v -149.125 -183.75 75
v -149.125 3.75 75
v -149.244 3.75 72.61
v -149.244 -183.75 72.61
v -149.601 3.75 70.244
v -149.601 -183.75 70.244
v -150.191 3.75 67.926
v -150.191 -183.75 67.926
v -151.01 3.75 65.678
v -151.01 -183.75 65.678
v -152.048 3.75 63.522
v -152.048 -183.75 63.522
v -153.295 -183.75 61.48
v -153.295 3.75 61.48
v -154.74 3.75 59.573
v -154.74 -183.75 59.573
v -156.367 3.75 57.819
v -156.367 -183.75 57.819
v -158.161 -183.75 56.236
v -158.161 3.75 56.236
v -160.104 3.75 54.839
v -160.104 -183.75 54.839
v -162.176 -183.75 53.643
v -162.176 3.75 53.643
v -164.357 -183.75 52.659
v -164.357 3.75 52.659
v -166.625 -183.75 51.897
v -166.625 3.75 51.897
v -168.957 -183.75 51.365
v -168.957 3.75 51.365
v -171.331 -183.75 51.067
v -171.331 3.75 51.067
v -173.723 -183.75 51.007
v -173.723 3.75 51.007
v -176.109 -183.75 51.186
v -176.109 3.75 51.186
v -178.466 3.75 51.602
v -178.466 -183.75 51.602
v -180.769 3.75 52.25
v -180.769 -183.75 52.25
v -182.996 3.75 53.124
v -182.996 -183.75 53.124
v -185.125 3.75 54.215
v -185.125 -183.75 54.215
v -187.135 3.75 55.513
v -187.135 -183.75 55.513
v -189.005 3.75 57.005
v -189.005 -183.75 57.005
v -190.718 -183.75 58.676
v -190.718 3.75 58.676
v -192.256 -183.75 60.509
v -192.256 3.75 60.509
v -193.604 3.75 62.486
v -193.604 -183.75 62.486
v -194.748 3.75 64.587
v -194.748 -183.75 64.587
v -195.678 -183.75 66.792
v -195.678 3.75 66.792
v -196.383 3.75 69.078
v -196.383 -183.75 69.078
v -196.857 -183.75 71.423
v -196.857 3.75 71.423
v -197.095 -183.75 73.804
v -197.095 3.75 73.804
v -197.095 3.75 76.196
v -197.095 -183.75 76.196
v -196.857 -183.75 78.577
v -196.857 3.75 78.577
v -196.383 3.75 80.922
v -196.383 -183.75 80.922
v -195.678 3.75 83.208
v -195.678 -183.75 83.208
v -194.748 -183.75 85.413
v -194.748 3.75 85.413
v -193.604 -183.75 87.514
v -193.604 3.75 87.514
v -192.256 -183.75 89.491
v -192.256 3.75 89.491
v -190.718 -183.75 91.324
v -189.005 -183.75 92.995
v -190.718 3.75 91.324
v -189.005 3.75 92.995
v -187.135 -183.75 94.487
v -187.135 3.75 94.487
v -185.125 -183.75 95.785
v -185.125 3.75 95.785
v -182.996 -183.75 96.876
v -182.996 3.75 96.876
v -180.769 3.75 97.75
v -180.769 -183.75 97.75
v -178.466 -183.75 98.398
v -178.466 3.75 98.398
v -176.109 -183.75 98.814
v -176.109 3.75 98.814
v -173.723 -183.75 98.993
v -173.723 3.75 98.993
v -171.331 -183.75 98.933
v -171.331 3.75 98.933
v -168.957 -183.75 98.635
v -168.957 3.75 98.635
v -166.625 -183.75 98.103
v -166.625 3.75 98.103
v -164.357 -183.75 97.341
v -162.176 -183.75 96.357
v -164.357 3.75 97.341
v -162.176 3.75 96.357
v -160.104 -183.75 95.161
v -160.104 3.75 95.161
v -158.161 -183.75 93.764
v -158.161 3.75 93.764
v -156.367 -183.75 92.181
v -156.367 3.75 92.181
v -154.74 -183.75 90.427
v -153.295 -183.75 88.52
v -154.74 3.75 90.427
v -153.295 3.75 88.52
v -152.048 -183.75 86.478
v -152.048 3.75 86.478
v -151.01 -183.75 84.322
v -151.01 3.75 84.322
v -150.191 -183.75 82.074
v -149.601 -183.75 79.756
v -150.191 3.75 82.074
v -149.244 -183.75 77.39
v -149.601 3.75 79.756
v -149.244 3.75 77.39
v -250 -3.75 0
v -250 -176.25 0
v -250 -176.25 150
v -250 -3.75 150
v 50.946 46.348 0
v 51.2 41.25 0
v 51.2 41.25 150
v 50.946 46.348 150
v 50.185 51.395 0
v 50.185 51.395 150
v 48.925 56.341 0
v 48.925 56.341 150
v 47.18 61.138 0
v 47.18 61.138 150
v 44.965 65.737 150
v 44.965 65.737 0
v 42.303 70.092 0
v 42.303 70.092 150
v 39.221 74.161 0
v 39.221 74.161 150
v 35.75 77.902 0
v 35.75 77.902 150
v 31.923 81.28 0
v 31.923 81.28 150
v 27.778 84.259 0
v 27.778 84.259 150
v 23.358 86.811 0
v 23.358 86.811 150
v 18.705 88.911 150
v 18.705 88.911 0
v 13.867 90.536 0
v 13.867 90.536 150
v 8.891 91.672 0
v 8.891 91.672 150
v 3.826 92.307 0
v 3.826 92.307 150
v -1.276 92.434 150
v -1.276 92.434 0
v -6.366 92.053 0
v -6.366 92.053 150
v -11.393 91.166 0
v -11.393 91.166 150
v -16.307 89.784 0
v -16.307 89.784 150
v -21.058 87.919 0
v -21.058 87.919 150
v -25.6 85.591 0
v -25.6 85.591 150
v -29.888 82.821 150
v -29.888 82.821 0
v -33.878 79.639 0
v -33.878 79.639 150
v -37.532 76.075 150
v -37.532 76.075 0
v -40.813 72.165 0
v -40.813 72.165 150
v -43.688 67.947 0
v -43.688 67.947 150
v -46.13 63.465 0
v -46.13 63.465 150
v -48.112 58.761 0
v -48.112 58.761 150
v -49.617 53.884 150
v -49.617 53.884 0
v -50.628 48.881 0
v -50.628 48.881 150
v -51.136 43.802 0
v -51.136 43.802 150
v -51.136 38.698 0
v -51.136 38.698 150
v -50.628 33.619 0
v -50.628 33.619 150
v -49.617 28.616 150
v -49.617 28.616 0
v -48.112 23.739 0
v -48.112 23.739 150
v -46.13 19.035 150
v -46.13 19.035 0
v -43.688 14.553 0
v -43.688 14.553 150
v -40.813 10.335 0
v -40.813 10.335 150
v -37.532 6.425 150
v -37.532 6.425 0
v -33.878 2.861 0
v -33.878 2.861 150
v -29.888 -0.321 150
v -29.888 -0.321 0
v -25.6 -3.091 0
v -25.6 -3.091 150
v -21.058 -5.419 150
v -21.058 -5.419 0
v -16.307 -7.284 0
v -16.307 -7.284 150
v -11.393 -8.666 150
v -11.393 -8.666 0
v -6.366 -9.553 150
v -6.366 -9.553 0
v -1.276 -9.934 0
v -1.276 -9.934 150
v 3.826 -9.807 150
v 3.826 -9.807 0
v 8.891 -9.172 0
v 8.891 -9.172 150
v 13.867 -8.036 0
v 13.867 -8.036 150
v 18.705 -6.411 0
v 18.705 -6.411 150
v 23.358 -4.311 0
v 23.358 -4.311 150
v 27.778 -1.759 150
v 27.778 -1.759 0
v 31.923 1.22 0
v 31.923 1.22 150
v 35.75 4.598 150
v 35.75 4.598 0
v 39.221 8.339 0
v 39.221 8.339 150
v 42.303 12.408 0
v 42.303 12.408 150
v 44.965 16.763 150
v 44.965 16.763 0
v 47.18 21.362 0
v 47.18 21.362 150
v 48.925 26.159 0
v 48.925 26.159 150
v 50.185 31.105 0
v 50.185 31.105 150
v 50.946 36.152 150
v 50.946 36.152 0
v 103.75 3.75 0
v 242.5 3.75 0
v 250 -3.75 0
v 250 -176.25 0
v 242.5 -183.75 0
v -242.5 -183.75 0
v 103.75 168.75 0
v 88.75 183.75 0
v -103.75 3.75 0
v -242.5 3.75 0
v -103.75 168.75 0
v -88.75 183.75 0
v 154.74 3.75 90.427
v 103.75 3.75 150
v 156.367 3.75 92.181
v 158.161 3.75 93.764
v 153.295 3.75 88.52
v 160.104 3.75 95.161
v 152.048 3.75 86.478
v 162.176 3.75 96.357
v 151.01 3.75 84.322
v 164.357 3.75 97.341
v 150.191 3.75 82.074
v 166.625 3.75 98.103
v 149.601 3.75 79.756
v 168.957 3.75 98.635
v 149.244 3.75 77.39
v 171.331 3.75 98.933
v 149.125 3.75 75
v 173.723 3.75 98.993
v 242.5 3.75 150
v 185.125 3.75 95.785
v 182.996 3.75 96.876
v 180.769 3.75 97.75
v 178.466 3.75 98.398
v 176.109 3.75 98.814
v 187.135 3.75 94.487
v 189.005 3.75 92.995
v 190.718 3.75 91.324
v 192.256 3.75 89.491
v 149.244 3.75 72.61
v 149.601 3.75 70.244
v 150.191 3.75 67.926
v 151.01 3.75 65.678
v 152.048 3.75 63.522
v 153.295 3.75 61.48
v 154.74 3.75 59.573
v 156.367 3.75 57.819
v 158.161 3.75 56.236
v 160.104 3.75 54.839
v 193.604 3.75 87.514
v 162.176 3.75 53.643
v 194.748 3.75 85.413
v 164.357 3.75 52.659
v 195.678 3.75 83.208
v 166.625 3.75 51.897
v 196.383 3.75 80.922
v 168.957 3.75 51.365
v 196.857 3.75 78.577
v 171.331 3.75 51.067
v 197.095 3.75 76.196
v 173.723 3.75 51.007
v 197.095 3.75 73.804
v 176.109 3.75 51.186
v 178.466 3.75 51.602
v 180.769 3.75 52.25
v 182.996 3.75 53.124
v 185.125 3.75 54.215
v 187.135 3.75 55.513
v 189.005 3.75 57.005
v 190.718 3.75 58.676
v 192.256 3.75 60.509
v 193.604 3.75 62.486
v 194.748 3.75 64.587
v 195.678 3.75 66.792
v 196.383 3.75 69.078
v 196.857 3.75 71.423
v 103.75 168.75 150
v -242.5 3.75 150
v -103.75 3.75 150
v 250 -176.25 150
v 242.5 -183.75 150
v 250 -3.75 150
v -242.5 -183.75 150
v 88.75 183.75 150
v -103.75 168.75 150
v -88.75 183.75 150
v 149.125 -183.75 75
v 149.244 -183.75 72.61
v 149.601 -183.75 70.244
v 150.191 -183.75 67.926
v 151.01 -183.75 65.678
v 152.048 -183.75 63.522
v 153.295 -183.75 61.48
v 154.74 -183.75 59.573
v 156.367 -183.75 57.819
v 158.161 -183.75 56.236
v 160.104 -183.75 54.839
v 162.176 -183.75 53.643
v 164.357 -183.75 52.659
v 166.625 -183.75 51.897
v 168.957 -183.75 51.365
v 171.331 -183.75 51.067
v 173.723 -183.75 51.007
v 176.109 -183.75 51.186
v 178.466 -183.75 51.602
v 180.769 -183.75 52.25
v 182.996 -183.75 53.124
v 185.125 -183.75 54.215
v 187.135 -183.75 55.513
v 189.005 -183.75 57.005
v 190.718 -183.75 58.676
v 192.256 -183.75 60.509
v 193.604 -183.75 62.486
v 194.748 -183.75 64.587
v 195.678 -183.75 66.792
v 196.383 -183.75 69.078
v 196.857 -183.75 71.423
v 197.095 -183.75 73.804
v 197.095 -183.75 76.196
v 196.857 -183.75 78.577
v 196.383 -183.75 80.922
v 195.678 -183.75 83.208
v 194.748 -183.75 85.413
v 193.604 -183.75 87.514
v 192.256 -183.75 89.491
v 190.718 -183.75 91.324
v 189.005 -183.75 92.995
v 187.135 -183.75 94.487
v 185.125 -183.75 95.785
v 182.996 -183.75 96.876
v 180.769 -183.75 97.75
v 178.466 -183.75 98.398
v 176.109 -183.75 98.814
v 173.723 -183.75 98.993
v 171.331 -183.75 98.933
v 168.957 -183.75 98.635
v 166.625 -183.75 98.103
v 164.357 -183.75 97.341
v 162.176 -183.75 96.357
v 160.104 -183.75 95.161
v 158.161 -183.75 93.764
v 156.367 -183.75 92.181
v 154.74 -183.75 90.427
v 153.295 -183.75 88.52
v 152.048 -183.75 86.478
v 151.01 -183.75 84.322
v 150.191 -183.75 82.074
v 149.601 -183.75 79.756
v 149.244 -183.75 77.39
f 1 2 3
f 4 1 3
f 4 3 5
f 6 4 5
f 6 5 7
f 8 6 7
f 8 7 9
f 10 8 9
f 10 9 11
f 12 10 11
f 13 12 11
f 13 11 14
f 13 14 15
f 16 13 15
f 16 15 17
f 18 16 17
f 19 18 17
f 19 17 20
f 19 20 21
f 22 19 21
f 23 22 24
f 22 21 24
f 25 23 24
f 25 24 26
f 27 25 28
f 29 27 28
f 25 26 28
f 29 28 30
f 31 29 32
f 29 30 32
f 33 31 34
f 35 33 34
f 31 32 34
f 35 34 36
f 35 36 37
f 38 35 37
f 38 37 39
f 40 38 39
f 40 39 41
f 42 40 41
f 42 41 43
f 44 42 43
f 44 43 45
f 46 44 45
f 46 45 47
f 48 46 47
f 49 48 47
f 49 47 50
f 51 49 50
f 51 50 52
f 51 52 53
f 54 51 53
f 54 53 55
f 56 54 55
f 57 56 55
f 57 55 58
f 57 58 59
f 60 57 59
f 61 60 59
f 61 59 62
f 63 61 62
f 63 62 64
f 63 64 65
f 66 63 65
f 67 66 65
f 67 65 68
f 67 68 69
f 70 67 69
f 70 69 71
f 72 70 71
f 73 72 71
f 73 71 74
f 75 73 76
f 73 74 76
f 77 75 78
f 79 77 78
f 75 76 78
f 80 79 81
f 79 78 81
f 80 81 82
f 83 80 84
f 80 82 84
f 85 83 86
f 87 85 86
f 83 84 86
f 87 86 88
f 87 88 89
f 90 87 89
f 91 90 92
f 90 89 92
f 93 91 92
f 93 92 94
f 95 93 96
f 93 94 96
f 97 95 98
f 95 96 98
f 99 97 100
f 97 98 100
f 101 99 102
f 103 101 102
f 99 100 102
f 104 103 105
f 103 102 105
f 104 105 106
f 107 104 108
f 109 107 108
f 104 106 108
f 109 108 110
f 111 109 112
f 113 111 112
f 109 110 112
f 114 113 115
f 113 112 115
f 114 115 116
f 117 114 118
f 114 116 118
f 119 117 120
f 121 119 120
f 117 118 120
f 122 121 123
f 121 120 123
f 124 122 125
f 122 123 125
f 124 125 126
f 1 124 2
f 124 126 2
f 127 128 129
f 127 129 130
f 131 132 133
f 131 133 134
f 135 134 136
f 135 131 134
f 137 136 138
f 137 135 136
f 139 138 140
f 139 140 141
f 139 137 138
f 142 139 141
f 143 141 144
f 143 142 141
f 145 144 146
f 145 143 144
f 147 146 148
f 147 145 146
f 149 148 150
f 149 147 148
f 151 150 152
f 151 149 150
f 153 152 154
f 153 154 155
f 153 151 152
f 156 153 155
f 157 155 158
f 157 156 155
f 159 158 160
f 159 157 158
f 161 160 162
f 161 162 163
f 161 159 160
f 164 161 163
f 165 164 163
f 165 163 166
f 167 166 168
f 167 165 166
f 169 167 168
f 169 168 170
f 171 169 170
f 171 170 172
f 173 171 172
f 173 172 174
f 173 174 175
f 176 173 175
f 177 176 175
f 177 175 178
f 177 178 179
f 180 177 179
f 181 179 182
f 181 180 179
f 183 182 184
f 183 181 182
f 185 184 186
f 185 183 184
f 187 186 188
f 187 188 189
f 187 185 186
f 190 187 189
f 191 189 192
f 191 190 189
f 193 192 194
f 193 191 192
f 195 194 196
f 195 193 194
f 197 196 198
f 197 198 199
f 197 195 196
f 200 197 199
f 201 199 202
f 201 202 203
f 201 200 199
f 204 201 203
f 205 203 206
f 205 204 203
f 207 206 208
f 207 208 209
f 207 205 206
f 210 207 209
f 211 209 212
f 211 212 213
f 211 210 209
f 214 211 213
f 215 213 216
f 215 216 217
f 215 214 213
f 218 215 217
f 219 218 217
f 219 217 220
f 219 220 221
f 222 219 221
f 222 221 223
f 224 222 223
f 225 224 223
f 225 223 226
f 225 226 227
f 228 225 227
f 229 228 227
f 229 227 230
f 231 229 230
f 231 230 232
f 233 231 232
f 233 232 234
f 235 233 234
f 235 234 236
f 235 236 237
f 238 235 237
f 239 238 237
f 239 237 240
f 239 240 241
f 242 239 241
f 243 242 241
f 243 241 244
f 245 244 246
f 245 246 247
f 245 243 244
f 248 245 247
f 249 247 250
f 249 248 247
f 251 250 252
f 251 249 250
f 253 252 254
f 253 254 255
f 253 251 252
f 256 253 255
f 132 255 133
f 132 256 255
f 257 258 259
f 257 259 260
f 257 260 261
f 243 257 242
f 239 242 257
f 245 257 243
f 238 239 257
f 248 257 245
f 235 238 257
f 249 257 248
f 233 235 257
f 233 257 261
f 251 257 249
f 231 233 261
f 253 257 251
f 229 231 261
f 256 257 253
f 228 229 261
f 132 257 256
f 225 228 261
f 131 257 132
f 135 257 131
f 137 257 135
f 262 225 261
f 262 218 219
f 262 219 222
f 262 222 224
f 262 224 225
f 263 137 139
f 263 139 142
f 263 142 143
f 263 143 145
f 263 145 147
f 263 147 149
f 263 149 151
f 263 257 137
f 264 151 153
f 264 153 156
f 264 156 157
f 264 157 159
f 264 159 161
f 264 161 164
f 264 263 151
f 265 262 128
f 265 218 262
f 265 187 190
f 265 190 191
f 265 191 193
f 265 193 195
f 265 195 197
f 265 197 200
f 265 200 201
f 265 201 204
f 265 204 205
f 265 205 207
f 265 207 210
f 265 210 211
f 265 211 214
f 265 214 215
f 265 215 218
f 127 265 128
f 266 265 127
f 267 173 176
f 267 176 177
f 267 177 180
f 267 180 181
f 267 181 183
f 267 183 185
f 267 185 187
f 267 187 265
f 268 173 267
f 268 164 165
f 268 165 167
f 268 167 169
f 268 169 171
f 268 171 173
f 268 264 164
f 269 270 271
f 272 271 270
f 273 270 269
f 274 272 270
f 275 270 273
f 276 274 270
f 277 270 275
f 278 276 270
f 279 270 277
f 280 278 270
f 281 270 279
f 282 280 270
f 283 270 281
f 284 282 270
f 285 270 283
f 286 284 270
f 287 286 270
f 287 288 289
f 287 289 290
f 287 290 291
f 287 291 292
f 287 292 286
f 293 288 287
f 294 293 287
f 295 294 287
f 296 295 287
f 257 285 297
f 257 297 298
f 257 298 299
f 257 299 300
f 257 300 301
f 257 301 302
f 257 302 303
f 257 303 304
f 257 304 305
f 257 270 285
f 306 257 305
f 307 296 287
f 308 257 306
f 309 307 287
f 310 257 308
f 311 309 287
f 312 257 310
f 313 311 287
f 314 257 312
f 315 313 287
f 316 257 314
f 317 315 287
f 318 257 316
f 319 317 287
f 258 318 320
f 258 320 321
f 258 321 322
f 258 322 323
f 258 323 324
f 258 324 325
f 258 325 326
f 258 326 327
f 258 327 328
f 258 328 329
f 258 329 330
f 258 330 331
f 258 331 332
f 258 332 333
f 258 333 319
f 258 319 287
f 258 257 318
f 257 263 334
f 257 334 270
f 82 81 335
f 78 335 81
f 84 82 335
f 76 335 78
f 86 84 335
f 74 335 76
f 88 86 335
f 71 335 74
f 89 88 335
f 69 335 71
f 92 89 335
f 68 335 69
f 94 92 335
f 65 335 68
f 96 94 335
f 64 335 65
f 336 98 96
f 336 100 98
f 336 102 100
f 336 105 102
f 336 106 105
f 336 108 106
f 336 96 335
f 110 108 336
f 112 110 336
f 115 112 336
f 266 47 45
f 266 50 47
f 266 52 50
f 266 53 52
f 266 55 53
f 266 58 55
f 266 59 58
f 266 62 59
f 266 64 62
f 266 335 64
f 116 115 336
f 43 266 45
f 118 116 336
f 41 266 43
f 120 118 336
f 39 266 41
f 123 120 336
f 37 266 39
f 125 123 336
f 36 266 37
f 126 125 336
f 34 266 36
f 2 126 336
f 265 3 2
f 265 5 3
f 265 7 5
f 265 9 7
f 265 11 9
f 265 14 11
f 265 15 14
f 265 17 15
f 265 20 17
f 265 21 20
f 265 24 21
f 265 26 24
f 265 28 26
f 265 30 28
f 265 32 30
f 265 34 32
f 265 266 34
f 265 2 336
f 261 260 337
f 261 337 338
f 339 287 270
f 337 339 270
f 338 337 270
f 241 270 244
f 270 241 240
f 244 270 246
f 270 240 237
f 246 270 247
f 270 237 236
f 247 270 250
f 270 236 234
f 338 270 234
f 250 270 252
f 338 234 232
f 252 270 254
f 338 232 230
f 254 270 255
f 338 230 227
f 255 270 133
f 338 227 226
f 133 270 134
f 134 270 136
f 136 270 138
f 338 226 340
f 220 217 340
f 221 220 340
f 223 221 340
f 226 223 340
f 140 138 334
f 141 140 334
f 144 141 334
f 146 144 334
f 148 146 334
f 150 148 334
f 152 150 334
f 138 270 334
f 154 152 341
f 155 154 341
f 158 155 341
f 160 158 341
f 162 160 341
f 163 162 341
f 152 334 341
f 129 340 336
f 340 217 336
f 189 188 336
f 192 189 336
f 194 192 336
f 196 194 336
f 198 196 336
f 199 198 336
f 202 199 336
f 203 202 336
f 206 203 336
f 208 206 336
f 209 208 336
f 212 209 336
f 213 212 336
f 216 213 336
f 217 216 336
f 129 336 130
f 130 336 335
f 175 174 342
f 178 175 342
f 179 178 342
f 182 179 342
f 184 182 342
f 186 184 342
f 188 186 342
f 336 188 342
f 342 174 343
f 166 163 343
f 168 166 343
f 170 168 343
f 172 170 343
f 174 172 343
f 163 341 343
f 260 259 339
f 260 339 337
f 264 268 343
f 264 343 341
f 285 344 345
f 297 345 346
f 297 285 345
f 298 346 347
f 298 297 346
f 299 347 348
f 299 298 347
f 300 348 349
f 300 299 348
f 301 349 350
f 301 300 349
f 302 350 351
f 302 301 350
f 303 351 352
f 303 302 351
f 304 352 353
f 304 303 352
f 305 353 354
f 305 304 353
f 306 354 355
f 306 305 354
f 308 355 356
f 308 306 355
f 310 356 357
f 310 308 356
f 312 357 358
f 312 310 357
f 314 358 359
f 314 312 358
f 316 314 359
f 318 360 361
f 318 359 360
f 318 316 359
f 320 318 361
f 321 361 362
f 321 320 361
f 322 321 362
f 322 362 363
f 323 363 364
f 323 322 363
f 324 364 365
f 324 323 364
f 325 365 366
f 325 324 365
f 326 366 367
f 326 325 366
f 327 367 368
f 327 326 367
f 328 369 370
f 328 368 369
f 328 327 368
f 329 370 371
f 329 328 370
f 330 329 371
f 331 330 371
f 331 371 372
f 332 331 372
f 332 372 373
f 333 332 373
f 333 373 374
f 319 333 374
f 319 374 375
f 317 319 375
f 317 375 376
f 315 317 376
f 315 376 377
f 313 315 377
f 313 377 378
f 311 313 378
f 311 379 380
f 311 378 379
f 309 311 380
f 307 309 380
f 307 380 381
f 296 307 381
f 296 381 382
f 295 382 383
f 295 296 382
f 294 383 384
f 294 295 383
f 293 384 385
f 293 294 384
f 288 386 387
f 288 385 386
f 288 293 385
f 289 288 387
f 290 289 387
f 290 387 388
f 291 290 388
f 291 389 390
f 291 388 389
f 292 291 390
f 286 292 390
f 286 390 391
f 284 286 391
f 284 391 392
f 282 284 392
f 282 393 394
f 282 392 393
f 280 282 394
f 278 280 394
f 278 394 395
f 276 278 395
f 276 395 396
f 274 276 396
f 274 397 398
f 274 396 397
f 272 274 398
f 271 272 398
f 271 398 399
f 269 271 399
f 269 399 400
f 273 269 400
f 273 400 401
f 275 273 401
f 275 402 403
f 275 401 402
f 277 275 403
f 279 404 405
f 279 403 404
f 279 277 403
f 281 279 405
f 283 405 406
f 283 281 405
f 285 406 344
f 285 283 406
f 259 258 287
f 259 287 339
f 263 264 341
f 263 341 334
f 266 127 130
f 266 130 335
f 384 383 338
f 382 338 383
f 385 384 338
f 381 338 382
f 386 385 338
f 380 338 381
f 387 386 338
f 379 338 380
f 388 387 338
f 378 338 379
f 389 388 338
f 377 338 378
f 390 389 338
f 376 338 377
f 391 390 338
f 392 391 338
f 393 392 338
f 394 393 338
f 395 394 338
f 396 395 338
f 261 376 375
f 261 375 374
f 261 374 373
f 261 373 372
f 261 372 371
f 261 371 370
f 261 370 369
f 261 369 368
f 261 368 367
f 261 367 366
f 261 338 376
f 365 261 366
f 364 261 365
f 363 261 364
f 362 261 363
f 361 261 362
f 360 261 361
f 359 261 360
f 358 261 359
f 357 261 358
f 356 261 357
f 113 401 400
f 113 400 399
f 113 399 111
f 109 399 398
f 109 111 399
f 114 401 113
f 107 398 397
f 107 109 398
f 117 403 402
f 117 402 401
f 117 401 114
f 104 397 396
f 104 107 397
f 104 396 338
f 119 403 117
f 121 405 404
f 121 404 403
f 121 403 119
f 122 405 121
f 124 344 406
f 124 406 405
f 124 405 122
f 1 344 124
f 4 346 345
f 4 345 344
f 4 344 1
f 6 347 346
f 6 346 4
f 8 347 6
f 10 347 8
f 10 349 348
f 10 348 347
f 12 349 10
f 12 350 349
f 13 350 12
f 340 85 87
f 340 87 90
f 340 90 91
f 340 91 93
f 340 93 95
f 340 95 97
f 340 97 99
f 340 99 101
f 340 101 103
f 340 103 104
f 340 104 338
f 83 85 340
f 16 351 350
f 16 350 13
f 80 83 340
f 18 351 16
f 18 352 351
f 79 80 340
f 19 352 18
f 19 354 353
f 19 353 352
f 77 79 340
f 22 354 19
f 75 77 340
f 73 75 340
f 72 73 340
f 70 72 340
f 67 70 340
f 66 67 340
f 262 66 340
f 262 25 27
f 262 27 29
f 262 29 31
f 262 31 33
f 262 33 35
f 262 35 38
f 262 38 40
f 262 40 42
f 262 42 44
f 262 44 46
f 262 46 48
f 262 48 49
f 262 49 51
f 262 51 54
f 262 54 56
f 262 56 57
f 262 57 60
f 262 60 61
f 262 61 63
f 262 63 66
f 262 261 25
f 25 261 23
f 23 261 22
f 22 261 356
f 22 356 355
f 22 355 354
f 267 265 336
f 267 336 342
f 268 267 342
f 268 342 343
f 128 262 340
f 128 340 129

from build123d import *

# Parameters (mm, degrees)
SKETCH6_R           = 51.2
BOSS_EXTRUDE4_DEPTH = 150
SKETCH7_R           = 24
CUT_EXTRUDE1_DEPTH  = 188.5


with BuildPart() as part:
    # Sketch6 → Boss-Extrude4 (new body)
    with BuildSketch(Plane.XY):
        Polygon((-250, -3.75), (-242.5, 3.75), (-103.75, 3.75), (-103.75, 168.75), (-88.75, 183.75), (88.75, 183.75), (103.75, 168.75), (103.75, 3.75), (242.5, 3.75), (250, -3.75), (250, -176.25), (242.5, -183.75), (-242.5, -183.75), (-250, -176.25), align=None)
        with Locations((0, 41.25)):
            Circle(SKETCH6_R, mode=Mode.SUBTRACT)
    extrude(amount=BOSS_EXTRUDE4_DEPTH)

    # Sketch7 → Cut-Extrude1 (cut, through all)
    with BuildSketch(Plane(origin=(0, 3.75, 0), x_dir=(1, 0, 0), z_dir=(0, 1, 0))):
        with Locations((-173.125, -75)):
            Circle(SKETCH7_R)
    cut_extrude1 = extrude(amount=-CUT_EXTRUDE1_DEPTH, mode=Mode.SUBTRACT)

    # Mirror1: Cut-Extrude1 across plane
    add(cut_extrude1.mirror(Plane(origin=(0, 0, 0), x_dir=(0, 0, 1), z_dir=(1, 0, 0))), mode=Mode.SUBTRACT)


solid = part.part
